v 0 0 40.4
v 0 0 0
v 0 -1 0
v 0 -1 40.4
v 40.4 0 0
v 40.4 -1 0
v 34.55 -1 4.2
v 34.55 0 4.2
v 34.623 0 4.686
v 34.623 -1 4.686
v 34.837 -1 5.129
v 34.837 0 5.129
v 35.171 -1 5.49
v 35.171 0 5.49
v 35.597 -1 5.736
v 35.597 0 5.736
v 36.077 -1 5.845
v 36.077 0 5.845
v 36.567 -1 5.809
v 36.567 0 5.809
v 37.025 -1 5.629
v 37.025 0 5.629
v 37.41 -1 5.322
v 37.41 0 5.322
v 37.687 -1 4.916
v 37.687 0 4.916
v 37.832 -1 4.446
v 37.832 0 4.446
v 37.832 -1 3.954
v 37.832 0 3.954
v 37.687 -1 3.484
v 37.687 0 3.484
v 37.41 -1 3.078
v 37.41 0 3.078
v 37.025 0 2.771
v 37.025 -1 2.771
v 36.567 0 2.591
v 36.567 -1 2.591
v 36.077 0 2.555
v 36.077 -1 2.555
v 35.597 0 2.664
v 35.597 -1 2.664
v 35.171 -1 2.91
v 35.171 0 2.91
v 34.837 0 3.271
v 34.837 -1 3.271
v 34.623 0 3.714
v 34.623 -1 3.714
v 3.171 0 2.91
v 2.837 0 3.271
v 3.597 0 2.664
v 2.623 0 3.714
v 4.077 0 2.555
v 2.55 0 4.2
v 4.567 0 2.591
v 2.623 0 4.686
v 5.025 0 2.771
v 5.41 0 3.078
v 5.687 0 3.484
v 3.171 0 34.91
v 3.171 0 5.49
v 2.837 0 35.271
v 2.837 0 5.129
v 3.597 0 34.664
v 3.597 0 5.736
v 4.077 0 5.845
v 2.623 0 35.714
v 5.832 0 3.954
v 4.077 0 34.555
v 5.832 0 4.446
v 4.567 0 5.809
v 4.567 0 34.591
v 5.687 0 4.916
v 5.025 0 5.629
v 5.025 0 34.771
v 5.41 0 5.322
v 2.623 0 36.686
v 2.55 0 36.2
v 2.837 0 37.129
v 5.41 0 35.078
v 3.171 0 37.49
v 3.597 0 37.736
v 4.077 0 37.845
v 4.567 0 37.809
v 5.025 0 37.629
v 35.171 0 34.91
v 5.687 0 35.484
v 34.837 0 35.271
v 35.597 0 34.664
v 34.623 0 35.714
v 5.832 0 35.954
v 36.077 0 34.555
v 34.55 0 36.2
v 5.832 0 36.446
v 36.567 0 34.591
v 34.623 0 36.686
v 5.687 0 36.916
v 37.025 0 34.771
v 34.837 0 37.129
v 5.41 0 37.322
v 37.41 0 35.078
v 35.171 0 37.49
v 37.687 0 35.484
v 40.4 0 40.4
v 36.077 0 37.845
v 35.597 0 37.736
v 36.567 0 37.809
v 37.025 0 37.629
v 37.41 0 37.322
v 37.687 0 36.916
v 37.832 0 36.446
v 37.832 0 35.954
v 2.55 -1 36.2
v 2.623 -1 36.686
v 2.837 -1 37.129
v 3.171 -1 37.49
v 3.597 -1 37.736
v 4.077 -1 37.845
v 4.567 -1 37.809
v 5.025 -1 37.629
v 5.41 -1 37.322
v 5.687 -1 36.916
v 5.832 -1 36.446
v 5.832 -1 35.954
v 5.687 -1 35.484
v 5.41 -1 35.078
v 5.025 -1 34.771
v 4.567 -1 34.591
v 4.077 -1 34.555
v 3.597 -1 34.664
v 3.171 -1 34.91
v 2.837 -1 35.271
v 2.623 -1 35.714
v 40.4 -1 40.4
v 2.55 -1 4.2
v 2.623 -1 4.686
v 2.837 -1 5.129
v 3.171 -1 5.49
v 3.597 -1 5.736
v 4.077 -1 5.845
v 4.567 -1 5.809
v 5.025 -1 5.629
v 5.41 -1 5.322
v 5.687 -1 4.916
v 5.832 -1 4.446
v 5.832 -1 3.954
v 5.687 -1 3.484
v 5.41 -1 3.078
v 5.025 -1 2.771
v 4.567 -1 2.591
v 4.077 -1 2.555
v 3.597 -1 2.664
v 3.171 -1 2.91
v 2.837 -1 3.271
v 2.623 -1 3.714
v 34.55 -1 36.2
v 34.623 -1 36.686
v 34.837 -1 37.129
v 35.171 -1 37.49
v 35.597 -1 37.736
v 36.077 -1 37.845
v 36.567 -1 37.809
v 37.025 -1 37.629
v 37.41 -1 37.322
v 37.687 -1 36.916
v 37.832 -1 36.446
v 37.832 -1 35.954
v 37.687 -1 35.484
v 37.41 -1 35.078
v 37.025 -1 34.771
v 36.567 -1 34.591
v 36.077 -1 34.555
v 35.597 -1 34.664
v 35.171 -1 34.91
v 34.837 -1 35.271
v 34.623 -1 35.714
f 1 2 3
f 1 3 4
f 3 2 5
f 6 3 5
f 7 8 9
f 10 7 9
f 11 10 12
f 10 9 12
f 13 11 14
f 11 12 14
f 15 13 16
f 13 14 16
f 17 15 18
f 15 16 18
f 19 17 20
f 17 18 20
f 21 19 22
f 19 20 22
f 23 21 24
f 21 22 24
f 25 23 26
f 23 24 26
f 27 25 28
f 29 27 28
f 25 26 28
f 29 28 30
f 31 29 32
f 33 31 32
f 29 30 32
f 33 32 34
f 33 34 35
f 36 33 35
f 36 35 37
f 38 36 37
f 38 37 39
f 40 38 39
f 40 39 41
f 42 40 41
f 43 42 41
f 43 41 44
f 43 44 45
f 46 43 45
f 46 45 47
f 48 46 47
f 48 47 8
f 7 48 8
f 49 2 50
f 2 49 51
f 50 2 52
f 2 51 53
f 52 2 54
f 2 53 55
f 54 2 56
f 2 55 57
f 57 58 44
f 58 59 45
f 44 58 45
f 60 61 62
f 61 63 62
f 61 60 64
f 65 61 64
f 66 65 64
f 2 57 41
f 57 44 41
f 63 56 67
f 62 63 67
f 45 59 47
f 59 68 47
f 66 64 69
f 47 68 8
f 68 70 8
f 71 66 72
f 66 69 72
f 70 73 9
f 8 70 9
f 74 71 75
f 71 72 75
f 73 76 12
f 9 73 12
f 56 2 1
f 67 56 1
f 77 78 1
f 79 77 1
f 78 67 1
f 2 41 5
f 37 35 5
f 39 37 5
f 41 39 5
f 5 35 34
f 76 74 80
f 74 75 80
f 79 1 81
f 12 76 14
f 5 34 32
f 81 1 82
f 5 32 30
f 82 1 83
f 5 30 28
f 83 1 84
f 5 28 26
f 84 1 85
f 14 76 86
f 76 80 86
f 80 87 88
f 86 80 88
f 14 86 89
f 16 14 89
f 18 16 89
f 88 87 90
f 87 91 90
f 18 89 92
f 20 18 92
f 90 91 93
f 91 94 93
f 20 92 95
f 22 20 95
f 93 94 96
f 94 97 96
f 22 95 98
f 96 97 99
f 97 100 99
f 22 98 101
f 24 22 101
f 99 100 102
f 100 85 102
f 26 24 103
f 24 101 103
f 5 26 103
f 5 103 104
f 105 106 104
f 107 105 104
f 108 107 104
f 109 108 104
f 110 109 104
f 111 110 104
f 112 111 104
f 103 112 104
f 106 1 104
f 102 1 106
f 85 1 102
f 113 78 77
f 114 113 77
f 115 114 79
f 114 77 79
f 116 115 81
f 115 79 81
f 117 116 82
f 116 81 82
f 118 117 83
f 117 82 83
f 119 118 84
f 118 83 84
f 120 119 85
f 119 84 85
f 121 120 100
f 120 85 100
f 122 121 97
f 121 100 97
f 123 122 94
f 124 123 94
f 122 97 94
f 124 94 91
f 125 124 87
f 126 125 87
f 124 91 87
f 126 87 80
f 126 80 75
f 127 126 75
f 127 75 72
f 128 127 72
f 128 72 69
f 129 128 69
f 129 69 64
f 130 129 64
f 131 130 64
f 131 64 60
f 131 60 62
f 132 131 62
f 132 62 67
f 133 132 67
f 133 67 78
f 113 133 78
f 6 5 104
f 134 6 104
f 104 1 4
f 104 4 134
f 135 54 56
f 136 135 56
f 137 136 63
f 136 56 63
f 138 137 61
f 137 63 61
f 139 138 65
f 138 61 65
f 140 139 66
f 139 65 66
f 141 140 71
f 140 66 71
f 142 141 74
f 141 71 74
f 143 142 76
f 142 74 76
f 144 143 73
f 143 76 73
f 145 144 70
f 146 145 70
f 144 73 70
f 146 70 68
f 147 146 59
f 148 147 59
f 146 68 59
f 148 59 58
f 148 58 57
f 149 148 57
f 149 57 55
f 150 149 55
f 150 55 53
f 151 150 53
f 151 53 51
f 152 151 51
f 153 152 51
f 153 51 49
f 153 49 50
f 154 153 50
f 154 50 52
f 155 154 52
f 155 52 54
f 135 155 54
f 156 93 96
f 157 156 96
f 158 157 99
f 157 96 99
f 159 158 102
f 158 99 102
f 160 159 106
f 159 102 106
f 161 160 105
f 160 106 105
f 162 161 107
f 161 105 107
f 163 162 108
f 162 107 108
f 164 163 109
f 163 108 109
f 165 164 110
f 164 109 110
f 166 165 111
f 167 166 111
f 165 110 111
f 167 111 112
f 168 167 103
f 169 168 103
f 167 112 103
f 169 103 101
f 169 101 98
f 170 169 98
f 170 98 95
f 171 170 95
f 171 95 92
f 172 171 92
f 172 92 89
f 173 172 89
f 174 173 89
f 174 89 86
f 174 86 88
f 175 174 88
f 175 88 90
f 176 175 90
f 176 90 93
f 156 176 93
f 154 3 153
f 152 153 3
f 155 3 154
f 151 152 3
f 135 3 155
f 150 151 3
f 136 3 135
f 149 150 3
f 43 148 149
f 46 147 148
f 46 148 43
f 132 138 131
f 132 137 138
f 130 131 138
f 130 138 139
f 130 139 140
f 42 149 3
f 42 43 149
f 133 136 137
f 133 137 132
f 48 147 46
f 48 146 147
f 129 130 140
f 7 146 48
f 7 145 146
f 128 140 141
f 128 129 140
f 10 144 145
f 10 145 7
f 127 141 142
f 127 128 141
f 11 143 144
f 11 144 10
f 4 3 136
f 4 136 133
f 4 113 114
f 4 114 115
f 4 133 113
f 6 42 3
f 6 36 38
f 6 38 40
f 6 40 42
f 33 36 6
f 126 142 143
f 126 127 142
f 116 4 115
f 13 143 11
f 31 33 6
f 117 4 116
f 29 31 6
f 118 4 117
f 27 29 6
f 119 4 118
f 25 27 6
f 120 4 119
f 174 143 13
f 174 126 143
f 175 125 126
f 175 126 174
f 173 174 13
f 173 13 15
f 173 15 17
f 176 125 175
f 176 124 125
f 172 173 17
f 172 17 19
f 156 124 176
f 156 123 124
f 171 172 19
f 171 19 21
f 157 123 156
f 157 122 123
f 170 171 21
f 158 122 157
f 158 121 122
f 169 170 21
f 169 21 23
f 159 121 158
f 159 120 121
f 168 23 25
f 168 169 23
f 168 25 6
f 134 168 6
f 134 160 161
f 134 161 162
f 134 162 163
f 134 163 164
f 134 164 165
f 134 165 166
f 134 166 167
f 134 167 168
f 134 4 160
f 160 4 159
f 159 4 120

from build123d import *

# Parameters (mm, degrees)
F0_W     = 40.4
F0_H     = 40.4
F1_DEPTH = 1
F3_D     = 3.3


with BuildPart() as f1:
    # F0 (on Front) → F1 (new body)
    with BuildSketch(Plane.XZ):
        with Locations((20.2, 20.2)):
            Rectangle(F0_W, F0_H)
    extrude(amount=F1_DEPTH)

    # F3 (through all)
    with Locations(Plane.XZ.offset(1)):
        with Locations((4.2, 36.2), (36.2, 36.2), (36.2, 4.2), (4.2, 4.2)):
            Hole(F3_D / 2)


solid = f1.part
